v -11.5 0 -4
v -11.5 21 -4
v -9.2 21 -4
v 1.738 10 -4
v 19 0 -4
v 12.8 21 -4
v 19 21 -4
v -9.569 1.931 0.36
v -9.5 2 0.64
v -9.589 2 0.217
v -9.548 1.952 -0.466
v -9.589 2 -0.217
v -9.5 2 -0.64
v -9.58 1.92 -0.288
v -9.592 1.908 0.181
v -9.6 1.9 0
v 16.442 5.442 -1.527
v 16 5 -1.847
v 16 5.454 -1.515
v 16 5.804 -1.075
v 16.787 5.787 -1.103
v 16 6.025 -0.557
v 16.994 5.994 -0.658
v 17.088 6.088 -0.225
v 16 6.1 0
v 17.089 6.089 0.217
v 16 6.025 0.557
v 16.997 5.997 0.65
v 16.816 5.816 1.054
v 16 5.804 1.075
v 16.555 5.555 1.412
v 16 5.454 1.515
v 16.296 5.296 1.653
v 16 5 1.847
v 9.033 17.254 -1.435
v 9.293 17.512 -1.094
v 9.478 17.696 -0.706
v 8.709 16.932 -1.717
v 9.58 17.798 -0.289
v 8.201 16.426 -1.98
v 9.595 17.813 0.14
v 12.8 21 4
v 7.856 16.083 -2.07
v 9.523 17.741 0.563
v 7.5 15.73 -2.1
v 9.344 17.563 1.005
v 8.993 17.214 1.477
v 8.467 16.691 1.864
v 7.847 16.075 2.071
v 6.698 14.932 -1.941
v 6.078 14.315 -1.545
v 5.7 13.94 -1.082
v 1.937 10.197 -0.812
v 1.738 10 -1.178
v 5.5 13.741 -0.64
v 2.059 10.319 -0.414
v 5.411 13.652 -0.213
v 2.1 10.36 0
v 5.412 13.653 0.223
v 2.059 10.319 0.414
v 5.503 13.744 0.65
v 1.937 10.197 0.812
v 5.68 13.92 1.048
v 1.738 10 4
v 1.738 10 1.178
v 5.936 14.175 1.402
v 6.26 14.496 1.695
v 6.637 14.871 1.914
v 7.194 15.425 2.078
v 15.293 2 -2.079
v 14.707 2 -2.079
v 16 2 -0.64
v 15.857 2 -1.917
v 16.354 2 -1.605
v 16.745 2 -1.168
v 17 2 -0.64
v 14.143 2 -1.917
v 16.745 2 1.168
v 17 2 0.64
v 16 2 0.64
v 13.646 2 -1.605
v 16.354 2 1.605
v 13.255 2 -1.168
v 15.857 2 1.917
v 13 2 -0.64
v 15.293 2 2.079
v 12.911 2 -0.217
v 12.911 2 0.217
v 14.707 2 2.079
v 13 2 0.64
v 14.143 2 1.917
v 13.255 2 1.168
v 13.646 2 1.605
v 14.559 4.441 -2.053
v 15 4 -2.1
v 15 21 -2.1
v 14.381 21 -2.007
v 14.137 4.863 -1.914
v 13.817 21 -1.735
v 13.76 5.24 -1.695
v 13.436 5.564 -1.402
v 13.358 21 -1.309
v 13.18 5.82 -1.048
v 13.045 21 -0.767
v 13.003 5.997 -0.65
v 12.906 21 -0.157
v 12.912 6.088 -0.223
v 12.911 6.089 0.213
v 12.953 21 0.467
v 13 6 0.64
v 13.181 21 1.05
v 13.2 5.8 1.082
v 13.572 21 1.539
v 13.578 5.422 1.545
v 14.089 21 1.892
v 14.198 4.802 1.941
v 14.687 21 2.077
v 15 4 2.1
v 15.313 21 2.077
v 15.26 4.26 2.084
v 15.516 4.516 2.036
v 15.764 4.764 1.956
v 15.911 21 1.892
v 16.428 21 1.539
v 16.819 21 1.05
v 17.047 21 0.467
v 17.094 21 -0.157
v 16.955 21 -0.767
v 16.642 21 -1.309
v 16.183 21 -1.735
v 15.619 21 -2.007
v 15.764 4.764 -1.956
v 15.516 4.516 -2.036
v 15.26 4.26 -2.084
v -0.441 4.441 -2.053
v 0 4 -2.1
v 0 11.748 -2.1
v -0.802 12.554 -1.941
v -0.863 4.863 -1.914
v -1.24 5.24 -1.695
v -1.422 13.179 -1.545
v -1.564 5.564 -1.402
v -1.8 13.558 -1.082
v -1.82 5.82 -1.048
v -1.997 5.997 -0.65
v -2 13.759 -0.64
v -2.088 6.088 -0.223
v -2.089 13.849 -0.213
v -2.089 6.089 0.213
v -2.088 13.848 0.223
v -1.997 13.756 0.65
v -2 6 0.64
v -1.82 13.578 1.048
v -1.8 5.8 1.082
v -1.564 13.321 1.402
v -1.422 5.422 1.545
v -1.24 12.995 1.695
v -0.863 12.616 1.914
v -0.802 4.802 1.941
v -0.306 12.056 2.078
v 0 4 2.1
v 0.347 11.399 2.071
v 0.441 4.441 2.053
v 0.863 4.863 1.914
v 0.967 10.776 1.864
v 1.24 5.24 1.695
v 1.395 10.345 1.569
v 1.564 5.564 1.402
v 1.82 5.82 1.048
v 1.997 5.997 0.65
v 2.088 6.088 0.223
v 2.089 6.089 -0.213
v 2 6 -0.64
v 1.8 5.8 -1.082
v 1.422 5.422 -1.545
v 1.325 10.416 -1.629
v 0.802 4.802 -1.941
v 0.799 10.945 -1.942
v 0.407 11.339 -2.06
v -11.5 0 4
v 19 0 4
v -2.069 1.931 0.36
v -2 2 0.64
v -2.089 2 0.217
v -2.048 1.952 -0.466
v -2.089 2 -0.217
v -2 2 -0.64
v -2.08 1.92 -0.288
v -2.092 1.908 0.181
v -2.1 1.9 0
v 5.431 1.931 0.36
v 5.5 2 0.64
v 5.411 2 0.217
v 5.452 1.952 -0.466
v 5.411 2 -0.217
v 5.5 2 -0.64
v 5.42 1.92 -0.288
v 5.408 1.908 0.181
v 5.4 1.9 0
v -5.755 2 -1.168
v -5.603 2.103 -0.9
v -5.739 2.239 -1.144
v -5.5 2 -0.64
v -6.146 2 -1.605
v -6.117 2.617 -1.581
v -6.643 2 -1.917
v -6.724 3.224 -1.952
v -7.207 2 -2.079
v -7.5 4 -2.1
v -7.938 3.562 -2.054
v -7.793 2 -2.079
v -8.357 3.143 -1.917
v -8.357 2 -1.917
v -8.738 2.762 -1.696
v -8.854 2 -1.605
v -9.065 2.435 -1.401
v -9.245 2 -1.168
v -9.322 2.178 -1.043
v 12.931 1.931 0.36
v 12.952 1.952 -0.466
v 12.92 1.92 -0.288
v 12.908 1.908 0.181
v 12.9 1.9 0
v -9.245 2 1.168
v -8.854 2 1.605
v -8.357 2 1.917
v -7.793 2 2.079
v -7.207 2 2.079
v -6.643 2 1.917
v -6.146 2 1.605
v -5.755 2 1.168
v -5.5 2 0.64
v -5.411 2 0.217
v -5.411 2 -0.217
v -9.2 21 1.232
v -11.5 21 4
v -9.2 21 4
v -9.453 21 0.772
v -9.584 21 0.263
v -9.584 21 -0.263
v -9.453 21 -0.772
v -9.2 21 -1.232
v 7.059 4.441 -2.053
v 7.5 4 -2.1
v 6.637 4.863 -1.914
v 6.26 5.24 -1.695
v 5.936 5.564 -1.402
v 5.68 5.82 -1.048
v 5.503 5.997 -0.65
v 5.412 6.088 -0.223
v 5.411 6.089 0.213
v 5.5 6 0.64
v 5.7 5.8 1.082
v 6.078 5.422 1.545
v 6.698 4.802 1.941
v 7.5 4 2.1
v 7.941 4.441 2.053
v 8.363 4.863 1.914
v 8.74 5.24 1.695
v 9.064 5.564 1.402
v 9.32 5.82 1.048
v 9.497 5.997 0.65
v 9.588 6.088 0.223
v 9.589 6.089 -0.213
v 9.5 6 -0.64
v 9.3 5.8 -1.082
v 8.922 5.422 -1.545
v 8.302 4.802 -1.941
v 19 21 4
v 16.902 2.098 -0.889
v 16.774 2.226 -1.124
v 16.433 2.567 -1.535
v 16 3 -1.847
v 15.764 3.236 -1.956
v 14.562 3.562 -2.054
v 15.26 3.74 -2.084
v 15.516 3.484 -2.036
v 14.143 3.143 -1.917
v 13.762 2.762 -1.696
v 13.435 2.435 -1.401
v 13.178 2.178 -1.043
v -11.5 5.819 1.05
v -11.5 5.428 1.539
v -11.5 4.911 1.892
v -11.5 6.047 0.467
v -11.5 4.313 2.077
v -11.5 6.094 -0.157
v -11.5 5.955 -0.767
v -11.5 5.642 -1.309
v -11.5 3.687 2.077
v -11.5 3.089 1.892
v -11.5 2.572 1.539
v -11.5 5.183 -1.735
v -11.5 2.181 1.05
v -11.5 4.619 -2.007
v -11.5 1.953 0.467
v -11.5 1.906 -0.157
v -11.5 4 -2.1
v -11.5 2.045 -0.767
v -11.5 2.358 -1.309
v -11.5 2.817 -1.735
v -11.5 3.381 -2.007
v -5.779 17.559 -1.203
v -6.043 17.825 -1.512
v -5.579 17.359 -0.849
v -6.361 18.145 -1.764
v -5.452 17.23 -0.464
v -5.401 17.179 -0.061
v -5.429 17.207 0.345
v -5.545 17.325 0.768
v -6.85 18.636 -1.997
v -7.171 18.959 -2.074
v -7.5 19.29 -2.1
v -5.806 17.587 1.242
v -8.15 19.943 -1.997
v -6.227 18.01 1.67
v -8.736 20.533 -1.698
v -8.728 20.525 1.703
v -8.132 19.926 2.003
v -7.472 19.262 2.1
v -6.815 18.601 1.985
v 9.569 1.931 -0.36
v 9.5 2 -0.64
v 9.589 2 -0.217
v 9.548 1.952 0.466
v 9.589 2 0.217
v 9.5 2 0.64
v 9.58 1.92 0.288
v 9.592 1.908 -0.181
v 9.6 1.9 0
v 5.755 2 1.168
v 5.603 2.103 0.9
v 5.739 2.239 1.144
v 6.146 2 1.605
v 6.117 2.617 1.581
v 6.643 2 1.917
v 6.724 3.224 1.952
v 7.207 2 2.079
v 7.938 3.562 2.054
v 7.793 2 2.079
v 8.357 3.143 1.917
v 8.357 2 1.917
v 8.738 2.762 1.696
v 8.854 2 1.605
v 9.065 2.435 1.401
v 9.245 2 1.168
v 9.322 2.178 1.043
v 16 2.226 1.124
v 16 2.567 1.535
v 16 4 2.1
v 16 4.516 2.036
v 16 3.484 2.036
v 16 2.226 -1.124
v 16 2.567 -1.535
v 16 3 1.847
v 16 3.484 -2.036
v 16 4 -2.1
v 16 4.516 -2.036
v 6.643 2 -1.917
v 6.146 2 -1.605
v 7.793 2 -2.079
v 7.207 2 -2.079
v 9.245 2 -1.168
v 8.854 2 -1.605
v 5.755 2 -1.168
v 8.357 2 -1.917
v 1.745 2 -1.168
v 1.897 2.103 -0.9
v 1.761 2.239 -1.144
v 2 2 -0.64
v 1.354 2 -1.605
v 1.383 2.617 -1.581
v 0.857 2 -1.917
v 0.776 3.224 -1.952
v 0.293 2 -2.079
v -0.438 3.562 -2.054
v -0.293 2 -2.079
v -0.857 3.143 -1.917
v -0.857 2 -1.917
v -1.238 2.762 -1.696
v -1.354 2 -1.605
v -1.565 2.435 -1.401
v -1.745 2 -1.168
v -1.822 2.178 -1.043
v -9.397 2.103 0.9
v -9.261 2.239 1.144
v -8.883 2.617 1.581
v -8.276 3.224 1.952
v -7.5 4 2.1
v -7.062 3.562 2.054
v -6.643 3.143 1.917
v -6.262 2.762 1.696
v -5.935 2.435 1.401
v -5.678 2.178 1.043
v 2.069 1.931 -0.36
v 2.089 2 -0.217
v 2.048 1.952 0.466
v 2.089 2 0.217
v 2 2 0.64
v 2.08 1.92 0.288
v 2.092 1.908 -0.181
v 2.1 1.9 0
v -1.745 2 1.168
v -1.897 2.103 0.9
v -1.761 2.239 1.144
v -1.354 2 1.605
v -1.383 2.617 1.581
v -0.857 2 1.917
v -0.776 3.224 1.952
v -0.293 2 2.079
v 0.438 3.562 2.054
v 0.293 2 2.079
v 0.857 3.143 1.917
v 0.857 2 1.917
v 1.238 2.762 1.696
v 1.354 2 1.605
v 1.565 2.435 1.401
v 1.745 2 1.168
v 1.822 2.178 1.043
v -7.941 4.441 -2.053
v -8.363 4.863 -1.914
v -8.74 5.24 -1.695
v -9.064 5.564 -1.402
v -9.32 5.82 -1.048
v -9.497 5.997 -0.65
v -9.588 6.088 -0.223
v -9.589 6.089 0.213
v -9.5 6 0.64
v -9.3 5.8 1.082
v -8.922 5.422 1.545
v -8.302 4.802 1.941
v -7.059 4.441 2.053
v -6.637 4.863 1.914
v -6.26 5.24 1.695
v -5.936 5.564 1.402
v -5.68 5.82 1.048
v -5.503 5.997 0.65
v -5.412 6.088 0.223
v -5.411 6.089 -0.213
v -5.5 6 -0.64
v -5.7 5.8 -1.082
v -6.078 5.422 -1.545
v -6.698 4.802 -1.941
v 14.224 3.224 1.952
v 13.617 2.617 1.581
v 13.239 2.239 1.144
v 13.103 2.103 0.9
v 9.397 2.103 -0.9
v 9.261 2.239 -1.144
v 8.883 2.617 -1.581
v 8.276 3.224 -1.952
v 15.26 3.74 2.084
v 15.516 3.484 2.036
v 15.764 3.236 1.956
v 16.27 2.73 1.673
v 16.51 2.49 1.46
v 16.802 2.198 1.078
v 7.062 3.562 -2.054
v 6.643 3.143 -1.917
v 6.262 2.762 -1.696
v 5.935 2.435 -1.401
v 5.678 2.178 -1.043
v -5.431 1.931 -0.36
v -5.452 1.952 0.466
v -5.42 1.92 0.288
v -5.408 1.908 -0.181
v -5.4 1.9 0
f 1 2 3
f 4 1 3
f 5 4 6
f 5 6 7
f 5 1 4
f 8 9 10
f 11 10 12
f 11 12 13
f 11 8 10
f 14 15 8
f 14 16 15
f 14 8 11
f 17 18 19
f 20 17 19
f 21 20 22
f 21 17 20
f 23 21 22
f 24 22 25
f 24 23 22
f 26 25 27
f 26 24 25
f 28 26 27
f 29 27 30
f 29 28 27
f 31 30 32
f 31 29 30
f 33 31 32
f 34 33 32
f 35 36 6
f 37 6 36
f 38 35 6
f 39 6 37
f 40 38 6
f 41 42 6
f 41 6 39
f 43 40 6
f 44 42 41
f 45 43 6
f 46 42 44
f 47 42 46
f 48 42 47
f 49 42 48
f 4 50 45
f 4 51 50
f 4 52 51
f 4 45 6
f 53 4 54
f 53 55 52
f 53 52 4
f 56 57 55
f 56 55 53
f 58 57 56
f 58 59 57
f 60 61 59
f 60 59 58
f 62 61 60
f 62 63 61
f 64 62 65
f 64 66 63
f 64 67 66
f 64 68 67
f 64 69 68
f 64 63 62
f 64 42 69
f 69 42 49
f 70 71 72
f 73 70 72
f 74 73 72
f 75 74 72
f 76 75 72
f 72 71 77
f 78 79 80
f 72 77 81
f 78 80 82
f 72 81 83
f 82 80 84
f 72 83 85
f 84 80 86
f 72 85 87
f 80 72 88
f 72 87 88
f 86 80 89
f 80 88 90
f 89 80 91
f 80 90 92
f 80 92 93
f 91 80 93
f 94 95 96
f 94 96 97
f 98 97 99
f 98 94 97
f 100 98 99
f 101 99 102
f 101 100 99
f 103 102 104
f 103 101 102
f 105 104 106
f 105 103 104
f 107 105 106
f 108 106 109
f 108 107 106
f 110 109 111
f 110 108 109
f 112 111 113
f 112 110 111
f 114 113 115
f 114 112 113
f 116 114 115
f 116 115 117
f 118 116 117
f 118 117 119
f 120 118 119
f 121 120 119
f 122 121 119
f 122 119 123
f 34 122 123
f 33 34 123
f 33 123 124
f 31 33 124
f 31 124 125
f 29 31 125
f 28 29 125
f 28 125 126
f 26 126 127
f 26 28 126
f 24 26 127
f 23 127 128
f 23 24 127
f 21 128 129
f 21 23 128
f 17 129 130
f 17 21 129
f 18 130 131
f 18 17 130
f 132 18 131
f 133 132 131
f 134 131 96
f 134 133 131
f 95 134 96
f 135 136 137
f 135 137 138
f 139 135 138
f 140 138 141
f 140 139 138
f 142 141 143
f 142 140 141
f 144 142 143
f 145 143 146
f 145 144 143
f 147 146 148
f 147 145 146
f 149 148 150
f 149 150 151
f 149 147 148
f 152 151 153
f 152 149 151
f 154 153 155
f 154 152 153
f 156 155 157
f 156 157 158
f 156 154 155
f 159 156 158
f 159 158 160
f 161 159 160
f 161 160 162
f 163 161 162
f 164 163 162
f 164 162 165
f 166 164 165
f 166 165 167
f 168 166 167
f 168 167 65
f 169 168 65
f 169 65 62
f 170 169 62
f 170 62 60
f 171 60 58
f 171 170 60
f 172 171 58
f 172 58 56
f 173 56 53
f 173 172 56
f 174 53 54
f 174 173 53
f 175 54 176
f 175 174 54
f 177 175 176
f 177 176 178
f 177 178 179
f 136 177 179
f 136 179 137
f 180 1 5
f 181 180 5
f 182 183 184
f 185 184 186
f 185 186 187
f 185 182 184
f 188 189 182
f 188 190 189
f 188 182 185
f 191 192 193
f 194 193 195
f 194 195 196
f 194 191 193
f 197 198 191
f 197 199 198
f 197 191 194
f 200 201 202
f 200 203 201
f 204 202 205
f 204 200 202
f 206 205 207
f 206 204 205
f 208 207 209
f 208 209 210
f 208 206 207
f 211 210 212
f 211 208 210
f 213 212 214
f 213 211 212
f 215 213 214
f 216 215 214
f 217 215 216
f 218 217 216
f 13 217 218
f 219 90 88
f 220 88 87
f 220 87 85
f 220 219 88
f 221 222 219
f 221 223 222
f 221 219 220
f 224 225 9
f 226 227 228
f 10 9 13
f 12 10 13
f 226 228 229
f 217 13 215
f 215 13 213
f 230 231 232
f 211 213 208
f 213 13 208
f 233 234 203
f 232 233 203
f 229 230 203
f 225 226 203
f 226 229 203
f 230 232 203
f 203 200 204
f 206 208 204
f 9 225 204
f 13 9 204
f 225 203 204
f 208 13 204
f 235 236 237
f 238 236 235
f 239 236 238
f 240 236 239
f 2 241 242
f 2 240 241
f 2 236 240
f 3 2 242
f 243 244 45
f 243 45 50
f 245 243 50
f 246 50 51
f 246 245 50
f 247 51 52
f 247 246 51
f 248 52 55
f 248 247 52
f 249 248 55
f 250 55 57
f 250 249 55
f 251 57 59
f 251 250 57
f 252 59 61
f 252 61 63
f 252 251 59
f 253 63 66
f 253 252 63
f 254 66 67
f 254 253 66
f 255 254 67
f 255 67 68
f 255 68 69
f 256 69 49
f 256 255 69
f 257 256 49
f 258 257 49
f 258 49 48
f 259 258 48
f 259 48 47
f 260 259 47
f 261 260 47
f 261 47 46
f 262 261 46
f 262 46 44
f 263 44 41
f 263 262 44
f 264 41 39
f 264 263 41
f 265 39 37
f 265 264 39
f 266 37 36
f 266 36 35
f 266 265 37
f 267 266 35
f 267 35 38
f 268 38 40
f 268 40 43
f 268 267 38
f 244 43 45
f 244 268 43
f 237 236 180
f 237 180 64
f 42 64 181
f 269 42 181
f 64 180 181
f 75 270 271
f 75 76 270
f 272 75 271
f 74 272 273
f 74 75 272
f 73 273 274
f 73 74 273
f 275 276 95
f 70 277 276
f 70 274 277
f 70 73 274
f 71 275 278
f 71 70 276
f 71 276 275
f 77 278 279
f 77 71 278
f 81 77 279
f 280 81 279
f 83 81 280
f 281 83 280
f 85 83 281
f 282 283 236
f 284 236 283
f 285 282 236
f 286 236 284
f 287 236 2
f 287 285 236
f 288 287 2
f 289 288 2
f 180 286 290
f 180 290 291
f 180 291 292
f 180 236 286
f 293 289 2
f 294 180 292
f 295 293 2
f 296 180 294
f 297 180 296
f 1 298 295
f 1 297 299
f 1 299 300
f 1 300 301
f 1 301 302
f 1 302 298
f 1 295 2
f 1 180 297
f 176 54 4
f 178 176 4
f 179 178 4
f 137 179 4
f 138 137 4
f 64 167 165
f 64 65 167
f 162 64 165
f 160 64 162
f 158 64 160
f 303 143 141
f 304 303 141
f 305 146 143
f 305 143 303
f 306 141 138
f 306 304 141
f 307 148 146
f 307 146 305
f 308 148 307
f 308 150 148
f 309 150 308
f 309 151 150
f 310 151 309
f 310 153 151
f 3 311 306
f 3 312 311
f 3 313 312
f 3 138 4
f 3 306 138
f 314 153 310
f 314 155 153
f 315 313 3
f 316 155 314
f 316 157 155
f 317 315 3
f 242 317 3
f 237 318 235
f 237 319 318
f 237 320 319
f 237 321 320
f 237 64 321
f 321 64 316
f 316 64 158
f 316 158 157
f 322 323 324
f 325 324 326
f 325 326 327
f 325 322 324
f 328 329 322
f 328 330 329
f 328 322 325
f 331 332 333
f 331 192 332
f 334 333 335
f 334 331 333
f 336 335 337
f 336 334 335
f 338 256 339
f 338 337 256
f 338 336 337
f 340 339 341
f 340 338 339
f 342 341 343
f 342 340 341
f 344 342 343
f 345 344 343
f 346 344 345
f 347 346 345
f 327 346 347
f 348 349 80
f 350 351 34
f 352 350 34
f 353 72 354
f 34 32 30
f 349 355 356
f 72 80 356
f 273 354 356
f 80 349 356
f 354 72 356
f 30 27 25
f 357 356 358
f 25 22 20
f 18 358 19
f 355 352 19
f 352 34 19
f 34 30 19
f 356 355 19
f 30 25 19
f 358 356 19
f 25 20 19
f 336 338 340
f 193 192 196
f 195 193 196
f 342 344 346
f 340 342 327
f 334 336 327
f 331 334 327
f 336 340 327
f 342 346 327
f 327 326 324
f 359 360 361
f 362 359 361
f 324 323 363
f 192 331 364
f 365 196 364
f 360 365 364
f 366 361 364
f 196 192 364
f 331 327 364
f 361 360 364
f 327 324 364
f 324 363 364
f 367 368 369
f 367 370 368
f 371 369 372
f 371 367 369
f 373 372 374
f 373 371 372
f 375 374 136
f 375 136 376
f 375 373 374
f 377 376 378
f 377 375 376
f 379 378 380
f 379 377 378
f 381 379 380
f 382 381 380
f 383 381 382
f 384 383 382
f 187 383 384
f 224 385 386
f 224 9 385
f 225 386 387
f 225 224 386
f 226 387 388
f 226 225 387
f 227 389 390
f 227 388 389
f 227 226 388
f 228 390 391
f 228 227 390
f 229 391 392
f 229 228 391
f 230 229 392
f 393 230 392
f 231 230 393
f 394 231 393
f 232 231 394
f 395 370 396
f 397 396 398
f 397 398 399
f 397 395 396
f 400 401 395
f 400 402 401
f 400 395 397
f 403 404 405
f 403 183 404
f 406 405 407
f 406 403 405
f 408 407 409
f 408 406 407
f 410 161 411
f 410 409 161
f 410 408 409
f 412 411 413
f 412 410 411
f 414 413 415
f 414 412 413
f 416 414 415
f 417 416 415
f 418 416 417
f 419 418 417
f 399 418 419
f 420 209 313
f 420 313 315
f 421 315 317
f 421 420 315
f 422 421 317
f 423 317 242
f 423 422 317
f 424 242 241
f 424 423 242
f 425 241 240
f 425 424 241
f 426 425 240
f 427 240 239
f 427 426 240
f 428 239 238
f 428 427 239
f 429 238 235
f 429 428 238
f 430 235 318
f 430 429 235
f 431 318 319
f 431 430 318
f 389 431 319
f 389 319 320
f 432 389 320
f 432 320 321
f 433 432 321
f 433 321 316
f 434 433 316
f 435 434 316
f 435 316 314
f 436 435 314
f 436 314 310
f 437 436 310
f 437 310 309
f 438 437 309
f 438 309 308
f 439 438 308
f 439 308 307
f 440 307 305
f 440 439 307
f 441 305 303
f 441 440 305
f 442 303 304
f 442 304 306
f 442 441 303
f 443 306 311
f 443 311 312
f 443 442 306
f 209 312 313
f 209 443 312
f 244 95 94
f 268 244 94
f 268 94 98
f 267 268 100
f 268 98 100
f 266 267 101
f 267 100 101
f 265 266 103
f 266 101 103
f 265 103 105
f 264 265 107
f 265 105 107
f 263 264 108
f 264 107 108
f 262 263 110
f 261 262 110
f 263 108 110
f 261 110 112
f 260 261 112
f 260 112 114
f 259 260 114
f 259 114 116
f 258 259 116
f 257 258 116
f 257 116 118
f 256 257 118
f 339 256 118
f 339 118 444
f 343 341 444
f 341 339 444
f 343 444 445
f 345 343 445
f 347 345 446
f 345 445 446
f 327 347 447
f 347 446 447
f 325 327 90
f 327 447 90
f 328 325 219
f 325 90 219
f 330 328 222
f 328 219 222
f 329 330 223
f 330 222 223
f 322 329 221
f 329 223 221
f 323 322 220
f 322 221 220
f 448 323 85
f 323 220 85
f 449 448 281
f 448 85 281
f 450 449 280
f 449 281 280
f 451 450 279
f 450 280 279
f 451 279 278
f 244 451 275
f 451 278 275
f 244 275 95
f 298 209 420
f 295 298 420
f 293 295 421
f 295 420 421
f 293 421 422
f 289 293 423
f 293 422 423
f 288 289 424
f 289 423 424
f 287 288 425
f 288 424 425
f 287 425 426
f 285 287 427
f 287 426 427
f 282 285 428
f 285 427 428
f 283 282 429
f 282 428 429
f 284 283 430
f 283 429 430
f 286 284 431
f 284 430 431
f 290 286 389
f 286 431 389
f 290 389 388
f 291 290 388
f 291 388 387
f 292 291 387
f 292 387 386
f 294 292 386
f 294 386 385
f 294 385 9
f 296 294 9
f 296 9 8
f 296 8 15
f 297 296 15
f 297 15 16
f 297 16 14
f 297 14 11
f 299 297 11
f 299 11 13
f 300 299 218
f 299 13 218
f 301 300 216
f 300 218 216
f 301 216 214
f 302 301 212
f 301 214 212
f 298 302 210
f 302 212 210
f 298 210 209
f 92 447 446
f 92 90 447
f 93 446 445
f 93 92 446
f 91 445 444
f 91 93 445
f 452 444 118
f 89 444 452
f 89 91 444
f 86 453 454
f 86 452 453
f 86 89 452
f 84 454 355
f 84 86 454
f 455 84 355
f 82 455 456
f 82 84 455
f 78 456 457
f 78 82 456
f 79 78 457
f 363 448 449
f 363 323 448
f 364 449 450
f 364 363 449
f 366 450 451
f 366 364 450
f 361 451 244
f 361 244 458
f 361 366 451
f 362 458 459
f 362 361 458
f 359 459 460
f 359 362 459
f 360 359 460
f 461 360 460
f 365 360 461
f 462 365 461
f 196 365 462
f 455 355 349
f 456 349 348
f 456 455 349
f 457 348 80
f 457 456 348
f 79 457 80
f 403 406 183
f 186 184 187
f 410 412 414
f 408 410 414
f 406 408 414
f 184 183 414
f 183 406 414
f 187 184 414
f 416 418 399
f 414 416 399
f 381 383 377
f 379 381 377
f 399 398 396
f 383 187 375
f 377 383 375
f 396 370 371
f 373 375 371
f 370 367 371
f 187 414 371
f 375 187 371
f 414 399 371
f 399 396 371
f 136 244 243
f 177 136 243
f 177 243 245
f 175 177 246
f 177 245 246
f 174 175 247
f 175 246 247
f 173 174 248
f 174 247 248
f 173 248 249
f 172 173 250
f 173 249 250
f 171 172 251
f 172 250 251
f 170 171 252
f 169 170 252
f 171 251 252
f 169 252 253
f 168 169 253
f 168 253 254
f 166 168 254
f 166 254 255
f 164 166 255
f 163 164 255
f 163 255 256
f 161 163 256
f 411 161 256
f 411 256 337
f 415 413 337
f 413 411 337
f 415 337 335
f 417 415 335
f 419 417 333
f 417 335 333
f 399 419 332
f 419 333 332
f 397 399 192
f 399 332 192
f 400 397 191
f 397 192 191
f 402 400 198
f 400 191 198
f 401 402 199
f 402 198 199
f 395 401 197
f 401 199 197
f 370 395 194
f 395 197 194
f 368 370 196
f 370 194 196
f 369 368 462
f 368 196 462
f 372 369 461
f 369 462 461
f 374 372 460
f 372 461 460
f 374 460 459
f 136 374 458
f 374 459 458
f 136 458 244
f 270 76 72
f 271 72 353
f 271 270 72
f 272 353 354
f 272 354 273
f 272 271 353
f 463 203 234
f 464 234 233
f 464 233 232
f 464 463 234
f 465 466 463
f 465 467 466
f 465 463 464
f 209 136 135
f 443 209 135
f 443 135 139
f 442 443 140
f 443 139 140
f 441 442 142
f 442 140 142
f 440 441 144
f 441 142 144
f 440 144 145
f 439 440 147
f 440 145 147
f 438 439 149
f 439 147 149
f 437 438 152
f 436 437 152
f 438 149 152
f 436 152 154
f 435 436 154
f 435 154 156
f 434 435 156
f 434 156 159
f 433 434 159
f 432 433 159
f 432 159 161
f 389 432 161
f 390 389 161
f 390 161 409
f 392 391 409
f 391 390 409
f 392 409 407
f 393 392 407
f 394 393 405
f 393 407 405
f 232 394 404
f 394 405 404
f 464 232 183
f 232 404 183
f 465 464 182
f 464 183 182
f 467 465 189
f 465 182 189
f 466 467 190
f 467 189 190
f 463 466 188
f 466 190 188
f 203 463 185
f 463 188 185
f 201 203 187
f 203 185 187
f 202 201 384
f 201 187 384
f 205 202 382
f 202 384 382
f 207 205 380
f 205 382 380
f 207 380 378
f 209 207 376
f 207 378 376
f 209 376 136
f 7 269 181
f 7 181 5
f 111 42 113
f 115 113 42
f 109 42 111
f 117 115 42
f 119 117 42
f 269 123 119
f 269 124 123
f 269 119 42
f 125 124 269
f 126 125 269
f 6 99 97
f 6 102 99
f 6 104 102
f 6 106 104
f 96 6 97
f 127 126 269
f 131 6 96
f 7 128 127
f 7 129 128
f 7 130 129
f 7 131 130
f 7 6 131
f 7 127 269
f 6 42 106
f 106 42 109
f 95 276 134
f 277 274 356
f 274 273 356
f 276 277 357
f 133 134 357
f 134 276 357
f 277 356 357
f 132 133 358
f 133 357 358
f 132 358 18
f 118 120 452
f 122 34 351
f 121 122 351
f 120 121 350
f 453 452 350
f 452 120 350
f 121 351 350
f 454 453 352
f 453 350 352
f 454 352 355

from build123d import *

# Parameters (mm, degrees)
SKETCH1_W           = 30.5
SKETCH1_H           = 8
SKETCH1_R           = 2.1
BOSS_EXTRUDE1_DEPTH = 21
CUT_EXTRUDE1_DEPTH  = 17.5
SKETCH4_R           = 2.1
CUT_EXTRUDE3_DEPTH  = 38.5
SKETCH6_R           = 2.1
BOSS_EXTRUDE3_DEPTH = 2
SKETCH7_R           = 2.1
BOSS_EXTRUDE4_DEPTH = 3


with BuildPart() as part:
    # Sketch1 → Boss-Extrude1 (new body)
    with BuildSketch(Plane(origin=(0, 0, 0), x_dir=(1, 0, 0), z_dir=(0, 1, 0))):
        with Locations((3.75, 0)):
            Rectangle(SKETCH1_W, SKETCH1_H)
        with Locations(Location((0, 0, 0), (0, 0, 90))):
            Circle(SKETCH1_R, mode=Mode.SUBTRACT)
        with Locations(Location((-7.5, 0, 0), (0, 0, 90))):
            Circle(SKETCH1_R, mode=Mode.SUBTRACT)
        with Locations(Location((7.5, 0, 0), (0, 0, 90))):
            Circle(SKETCH1_R, mode=Mode.SUBTRACT)
        with Locations(Location((15, 0, 0), (0, 0, 90))):
            Circle(SKETCH1_R, mode=Mode.SUBTRACT)
    extrude(amount=BOSS_EXTRUDE1_DEPTH)

    # Sketch2 → Cut-Extrude1 (cut)
    with BuildSketch(Plane.XY.offset(4)):
        Polygon((12.8, 21), (1.738392209, 10), (-9.200343126, 21), align=None)
    extrude(amount=-CUT_EXTRUDE1_DEPTH, mode=Mode.SUBTRACT)

    # Sketch4 → Cut-Extrude3 (cut)
    with BuildSketch(Plane(origin=(19, 0, 0), x_dir=(0, 0, -1), z_dir=(1, 0, 0))):
        with Locations((0, 4)):
            Circle(SKETCH4_R)
    extrude(amount=-CUT_EXTRUDE3_DEPTH, mode=Mode.SUBTRACT)

    # Sketch6 → Boss-Extrude3 (add)
    with BuildSketch(Plane.XZ):
        with Locations(Location((-7.5, 0, 0), (0, 0, 270))):
            Circle(SKETCH6_R)
        with Locations(Location((0, 0, 0), (0, 0, 270))):
            Circle(SKETCH6_R)
        with Locations(Location((7.5, 0, 0), (0, 0, 270))):
            Circle(SKETCH6_R)
        with Locations(Location((15, 0, 0), (0, 0, 90))):
            Circle(SKETCH6_R)
    extrude(amount=-BOSS_EXTRUDE3_DEPTH)

    # Sketch7 → Boss-Extrude4 (add)
    with BuildSketch(Plane(origin=(19, 0, 0), x_dir=(0, 0, -1), z_dir=(1, 0, 0))):
        with Locations((0, 4)):
            Circle(SKETCH7_R)
    extrude(amount=-BOSS_EXTRUDE4_DEPTH)


solid = part.part
